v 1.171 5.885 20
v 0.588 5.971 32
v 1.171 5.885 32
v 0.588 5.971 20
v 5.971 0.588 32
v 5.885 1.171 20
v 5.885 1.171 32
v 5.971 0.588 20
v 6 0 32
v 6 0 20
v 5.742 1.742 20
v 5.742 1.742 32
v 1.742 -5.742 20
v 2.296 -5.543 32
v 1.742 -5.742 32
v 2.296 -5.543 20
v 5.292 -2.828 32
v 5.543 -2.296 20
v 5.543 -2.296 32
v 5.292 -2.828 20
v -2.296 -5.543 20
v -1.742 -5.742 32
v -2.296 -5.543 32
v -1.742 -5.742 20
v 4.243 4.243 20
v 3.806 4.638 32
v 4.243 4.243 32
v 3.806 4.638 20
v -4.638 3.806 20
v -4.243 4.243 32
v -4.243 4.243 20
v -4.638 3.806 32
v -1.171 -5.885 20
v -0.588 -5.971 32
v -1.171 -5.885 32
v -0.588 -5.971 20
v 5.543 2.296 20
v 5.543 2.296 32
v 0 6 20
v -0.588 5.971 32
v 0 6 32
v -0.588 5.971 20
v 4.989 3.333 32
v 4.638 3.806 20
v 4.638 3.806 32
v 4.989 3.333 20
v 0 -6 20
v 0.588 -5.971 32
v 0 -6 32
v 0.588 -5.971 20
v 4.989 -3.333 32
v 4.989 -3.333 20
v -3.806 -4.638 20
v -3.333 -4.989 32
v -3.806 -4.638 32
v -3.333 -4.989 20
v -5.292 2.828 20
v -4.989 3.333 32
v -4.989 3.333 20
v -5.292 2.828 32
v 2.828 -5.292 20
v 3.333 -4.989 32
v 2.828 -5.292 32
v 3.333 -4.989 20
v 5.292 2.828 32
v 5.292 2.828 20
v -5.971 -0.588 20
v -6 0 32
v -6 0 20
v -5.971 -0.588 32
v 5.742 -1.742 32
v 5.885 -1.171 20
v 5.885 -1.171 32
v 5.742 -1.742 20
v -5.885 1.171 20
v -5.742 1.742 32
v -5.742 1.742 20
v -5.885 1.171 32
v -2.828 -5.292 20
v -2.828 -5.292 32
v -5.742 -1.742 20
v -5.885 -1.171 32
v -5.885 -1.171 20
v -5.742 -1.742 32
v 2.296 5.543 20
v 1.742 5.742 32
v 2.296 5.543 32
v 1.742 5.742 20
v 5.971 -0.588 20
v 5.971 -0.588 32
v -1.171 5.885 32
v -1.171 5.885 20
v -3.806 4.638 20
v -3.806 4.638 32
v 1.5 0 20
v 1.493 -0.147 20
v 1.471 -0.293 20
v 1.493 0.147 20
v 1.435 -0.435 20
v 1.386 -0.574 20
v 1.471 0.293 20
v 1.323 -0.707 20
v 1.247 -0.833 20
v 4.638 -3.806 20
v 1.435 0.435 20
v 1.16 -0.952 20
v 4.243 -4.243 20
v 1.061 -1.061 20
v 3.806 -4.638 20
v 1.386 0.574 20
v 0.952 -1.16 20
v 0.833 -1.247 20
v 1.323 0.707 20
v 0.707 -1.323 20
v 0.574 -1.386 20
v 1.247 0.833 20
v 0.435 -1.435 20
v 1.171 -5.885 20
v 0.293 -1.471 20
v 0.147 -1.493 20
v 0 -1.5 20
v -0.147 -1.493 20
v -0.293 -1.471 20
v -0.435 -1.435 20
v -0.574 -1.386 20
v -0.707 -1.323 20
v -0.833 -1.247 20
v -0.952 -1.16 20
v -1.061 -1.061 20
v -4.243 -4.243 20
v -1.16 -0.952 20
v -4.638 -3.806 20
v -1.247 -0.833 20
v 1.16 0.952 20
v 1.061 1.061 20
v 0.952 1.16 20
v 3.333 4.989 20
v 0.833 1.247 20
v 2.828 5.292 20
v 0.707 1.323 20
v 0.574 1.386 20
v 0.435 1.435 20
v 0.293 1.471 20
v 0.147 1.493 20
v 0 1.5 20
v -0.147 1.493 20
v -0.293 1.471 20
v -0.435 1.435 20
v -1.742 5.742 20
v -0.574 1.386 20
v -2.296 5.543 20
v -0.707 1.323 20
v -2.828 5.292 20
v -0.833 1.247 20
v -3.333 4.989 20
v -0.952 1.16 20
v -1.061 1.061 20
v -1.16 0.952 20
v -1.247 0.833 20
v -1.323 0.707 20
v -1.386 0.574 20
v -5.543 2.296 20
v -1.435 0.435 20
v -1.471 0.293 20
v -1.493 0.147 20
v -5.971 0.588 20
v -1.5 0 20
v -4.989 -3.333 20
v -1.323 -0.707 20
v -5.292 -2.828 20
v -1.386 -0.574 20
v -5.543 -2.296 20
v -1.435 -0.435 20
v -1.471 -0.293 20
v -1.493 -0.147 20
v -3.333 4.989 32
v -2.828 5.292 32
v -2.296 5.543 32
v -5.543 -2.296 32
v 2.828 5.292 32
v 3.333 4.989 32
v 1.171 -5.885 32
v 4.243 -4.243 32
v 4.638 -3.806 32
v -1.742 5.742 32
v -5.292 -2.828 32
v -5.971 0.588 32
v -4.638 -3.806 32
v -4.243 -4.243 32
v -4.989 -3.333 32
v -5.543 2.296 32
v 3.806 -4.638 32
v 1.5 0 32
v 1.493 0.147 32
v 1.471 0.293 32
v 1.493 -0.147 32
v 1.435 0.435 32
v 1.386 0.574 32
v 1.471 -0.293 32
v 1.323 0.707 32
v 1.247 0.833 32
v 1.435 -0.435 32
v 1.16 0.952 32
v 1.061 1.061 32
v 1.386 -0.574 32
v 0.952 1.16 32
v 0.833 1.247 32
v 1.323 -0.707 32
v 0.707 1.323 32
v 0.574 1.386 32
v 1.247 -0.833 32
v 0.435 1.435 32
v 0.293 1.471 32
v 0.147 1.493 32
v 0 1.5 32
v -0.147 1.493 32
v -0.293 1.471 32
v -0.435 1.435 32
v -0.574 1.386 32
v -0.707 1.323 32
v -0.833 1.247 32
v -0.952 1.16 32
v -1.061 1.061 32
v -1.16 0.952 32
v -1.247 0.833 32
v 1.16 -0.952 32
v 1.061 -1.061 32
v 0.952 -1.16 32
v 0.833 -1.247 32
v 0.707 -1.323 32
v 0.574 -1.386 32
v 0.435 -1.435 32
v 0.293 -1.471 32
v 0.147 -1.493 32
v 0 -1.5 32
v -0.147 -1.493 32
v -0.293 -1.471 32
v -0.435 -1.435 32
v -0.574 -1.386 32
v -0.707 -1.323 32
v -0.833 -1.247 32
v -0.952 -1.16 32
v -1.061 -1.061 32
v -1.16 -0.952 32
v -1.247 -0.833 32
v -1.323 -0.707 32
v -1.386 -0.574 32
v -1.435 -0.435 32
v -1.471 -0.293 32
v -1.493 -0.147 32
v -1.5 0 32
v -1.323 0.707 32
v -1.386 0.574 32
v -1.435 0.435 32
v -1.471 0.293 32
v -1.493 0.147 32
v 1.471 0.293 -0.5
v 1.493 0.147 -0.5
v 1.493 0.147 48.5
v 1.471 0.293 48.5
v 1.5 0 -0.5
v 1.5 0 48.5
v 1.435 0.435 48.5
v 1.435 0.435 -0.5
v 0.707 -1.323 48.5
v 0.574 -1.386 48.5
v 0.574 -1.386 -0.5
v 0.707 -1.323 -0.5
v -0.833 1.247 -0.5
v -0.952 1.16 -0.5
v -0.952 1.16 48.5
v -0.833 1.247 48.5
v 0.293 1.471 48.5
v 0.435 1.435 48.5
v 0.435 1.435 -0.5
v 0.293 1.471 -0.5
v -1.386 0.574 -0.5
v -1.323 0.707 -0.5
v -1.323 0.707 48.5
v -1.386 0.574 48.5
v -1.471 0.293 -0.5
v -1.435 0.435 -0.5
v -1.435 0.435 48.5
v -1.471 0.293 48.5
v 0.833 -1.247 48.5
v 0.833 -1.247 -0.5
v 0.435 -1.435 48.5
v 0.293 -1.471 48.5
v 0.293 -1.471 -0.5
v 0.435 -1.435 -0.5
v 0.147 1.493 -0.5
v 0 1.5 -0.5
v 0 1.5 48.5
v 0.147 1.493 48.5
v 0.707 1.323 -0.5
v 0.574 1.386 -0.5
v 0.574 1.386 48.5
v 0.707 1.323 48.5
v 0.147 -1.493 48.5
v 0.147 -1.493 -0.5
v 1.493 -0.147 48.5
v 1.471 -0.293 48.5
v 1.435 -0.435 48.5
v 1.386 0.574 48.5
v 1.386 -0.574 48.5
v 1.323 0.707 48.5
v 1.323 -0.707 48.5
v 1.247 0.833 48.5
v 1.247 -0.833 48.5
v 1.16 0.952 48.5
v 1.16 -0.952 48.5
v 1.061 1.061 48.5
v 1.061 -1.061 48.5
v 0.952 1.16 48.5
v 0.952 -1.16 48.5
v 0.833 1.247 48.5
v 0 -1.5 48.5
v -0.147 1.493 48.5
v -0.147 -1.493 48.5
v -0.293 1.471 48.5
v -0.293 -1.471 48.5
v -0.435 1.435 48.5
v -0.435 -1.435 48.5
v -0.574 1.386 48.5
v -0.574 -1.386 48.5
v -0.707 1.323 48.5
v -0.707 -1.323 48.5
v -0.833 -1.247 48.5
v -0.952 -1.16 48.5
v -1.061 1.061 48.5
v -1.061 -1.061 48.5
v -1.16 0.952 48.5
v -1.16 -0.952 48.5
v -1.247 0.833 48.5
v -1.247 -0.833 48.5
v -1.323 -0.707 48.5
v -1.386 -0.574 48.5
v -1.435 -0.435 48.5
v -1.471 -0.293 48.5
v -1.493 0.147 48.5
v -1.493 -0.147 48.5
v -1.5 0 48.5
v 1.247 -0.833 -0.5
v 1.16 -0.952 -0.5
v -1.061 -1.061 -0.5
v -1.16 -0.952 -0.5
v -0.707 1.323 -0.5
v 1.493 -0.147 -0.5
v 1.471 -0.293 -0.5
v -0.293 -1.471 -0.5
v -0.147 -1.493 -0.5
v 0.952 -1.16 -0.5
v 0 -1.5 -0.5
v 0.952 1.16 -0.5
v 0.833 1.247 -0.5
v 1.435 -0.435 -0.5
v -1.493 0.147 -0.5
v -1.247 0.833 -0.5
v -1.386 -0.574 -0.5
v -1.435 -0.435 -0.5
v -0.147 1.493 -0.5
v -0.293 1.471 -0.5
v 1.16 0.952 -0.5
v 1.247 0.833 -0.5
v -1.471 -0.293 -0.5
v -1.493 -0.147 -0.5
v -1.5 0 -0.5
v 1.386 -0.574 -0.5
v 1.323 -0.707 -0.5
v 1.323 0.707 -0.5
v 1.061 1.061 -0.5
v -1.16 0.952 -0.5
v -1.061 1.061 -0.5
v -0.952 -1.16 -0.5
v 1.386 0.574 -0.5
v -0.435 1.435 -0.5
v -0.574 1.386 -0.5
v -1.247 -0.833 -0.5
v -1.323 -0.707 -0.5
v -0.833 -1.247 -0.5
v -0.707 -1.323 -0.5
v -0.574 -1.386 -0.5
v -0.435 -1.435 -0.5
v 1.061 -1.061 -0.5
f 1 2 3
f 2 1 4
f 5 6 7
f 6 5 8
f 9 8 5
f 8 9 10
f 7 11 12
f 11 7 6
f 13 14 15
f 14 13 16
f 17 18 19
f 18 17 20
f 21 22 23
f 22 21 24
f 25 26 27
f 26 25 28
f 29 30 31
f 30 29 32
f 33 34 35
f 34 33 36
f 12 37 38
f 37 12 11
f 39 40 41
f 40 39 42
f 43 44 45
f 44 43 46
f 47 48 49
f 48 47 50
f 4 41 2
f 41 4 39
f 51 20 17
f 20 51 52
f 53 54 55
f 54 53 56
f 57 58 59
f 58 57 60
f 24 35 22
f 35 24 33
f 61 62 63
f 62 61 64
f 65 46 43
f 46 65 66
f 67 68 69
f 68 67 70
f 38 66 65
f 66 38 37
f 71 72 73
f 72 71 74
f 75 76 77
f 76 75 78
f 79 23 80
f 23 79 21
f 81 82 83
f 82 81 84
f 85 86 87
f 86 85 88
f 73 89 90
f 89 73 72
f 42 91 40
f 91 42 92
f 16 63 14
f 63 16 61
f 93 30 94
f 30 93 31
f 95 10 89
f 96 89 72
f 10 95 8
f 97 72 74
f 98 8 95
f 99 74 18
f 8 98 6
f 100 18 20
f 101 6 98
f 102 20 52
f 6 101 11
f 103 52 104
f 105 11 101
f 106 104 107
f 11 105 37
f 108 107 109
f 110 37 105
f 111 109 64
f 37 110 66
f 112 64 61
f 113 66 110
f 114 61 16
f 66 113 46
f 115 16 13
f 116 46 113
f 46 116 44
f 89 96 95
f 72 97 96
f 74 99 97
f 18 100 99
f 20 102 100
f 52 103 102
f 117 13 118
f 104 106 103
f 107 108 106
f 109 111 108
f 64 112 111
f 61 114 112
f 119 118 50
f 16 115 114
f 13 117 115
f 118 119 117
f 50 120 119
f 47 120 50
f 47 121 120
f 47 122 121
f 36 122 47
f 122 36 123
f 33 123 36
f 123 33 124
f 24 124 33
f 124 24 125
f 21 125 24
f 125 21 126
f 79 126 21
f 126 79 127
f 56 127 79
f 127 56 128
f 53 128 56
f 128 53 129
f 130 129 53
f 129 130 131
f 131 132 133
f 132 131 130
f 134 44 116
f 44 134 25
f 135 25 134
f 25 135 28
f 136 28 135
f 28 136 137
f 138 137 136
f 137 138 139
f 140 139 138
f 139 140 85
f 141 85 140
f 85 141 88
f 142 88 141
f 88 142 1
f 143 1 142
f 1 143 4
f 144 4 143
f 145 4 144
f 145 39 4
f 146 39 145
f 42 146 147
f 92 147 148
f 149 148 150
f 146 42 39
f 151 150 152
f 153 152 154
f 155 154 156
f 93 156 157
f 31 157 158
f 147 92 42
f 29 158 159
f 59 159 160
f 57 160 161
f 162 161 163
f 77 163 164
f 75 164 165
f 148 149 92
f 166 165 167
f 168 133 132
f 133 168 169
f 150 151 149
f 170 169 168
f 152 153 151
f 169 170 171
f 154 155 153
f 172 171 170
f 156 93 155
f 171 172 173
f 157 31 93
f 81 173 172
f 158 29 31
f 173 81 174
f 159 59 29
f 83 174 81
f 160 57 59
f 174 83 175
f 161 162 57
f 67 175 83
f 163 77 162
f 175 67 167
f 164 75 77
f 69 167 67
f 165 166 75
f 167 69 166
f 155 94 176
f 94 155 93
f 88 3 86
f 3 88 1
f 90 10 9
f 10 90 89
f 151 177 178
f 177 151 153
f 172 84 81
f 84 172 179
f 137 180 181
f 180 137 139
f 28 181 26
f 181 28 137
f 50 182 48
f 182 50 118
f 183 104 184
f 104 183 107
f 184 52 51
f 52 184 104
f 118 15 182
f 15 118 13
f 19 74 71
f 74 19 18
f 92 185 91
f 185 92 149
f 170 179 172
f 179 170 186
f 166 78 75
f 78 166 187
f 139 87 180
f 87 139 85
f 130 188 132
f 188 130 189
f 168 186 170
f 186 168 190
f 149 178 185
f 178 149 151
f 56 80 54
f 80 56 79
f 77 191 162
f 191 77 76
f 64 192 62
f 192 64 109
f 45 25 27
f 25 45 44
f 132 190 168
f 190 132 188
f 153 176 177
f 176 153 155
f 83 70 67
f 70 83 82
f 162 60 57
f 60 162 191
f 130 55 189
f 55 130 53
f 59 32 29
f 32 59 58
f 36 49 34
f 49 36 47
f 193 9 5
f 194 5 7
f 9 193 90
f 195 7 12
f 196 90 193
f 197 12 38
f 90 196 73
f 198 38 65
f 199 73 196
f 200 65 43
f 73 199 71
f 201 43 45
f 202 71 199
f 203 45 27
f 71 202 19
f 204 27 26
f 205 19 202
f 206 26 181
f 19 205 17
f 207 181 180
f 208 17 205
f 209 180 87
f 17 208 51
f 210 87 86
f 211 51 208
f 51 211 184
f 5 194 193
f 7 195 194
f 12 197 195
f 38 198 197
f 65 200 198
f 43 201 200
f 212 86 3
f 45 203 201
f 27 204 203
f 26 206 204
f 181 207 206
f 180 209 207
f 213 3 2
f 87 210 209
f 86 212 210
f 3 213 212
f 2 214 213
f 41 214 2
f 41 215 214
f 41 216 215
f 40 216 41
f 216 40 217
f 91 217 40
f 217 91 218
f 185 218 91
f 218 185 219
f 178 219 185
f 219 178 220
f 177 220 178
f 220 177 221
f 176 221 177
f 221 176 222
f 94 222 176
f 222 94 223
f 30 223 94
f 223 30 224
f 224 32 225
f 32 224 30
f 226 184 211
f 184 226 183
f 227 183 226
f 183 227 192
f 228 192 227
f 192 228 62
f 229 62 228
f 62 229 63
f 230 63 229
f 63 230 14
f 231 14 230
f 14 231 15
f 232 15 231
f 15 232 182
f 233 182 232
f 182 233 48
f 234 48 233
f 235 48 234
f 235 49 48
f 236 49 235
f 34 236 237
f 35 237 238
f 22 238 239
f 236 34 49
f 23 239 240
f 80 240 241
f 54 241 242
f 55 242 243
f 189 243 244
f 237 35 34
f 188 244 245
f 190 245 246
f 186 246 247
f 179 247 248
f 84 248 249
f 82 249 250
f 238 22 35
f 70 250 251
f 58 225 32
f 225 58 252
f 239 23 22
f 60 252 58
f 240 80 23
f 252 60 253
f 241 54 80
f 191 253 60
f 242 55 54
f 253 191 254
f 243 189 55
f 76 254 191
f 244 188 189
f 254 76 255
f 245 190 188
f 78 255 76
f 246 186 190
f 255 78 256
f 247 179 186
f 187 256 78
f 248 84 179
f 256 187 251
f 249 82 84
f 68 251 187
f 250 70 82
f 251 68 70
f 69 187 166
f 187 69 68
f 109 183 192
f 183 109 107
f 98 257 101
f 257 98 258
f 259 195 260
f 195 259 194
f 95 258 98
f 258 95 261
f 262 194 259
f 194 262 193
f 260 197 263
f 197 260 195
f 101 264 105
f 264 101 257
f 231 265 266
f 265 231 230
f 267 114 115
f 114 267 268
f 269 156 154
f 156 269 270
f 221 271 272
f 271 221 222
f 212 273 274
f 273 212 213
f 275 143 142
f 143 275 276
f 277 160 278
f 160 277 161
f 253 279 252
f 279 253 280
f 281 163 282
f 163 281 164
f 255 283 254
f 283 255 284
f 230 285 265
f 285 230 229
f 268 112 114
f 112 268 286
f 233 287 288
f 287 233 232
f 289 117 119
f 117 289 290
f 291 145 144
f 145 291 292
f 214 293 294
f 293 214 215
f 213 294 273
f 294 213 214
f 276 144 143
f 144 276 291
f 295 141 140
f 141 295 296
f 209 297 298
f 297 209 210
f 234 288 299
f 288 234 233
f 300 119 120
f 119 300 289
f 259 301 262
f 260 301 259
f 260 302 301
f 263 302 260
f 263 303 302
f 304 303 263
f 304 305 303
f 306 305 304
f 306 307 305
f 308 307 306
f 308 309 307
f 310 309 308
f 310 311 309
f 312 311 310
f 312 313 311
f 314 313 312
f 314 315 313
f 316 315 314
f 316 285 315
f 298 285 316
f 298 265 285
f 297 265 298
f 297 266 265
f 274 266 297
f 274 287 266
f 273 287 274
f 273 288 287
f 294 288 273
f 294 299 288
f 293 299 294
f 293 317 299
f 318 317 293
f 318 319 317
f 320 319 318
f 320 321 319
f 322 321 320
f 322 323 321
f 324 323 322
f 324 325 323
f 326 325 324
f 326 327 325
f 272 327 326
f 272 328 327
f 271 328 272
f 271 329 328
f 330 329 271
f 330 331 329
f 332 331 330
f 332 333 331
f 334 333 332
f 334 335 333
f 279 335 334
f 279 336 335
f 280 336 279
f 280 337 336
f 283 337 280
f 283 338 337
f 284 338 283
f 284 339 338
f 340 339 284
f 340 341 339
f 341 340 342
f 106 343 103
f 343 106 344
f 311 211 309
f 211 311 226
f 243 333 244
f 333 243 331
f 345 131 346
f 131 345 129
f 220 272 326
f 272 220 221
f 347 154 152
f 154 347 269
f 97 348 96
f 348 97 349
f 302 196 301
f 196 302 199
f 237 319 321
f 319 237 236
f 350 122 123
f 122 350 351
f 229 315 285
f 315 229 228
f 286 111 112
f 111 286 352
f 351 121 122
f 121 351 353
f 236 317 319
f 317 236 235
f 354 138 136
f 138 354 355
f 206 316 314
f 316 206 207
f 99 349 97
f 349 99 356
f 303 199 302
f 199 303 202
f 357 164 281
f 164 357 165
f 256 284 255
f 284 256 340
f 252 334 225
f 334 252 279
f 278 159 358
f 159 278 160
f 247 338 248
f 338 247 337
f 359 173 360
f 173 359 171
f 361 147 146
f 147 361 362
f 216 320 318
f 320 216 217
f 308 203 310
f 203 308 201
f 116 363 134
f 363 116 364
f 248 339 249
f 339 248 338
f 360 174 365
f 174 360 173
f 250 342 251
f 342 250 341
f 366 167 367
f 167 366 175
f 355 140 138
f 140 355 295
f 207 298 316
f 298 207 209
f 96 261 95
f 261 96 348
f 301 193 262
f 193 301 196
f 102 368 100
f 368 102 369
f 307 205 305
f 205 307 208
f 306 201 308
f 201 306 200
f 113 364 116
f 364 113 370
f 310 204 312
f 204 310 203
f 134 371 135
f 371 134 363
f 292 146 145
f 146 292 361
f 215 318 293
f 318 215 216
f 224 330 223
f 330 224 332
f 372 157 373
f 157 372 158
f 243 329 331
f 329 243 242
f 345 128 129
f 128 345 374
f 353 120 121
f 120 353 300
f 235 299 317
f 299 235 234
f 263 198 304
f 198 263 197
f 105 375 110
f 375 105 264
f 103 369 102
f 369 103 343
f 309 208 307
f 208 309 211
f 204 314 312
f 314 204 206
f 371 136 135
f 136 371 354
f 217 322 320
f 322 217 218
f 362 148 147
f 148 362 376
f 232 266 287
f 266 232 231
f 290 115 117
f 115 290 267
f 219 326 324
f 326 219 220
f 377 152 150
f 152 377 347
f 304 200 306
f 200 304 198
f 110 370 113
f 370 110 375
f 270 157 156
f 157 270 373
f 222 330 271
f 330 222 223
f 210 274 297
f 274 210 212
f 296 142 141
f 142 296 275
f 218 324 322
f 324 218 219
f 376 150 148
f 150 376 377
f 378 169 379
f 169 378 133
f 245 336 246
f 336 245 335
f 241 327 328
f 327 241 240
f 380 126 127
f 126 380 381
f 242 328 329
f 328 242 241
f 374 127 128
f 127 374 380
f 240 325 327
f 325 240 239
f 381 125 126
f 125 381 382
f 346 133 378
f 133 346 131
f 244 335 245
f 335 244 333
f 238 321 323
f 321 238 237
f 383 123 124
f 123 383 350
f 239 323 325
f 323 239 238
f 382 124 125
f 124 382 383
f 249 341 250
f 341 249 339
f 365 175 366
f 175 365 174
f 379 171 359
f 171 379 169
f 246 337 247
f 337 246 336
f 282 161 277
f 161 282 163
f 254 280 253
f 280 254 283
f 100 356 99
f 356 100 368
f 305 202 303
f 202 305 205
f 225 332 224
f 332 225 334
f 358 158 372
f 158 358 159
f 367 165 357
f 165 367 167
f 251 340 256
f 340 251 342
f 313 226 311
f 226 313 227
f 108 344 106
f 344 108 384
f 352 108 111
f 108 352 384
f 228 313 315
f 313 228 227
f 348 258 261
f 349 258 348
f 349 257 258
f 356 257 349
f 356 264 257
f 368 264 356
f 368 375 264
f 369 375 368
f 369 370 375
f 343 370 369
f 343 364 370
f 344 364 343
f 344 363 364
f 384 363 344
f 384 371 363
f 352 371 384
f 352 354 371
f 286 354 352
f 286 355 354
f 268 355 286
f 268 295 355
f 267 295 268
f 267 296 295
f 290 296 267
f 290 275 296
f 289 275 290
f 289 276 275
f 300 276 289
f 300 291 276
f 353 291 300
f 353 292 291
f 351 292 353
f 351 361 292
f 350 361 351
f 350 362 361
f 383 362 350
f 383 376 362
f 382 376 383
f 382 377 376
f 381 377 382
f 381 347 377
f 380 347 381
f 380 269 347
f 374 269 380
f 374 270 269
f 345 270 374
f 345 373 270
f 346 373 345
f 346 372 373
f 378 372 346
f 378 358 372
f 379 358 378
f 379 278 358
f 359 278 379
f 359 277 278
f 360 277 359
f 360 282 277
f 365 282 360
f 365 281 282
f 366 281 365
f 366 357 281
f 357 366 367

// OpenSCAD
// Hose-barb reducer: joins 8 mm and 5 mm silicone tubing
// Print orientation: standing upright along +Z

$fn = 64;

// ---- Dimensions (mm) ----
tube_d1      = 8;     // larger tubing inner diameter
tube_d2      = 5;     // smaller tubing inner diameter
bore         = 3;     // through-bore diameter
length_d1    = 20;    // height of 8 mm tubing section
length_d2    = 16;    // height of 5 mm tubing section (z = 25 to z = 41)
collar_d     = 12;    // cylindrical collar diameter
barb_d1_bot  = 7.5;   // barb outer diameter at bottom (8 mm tubing)
barb_d1_top  = 9.5;   // barb outer diameter at top of 8 mm tubing barbs
barb_d2_bot  = 6.5;   // barb outer diameter at bottom (5 mm tubing)
barb_d2_top  = 5.0;   // barb outer diameter at top of 5 mm tubing barbs
eps          = 0.5;   // cutter overshoot past faces

// ---- Derived ----
z_start_d2   = length_d1 + collar_d;   // z = 25, start of 5 mm tubing section
barb_d1_avg  = (barb_d1_bot + barb_d1_top) / 2;

// ---- Model ----
union() {
    // Section 1: z = 0 to 20, two stacked barbs for 8 mm tubing
    for (s = [-1, 1])
        translate([0, 0, s * length_d1 / 2 - 1])
            linear_extrude(height = length_d1 + 2)
                union() {
                    cylinder(d = barb_d1_bot);
                    translate([0, 0, s * length_d1 / 2 - 1])
                        cylinder(d = barb_d1_top, h = eps);
                }

    // Section 2: z = 20 to 25, cylindrical collar
    translate([0, 0, length_d1])
        cylinder(d = collar_d, h = collar_d);

    // Section 3: z = 25 to 41, two stacked barbs for 5 mm tubing
    for (s = [-1, 1])
        translate([0, 0, z_start_d2 + s * length_d2 / 2 - 1])
            linear_extrude(height = length_d2 + 2)
                union() {
                    cylinder(d = barb_d2_bot);
                    translate([0, 0, z_start_d2 + s * length_d2 / 2 - 1])
                        cylinder(d = barb_d2_top, h = eps);
                }

    // Through-bore
    translate([0, 0, -eps])
        cylinder(d = bore, h = length_d1 + collar_d + length_d2 + 2 * eps);
}
